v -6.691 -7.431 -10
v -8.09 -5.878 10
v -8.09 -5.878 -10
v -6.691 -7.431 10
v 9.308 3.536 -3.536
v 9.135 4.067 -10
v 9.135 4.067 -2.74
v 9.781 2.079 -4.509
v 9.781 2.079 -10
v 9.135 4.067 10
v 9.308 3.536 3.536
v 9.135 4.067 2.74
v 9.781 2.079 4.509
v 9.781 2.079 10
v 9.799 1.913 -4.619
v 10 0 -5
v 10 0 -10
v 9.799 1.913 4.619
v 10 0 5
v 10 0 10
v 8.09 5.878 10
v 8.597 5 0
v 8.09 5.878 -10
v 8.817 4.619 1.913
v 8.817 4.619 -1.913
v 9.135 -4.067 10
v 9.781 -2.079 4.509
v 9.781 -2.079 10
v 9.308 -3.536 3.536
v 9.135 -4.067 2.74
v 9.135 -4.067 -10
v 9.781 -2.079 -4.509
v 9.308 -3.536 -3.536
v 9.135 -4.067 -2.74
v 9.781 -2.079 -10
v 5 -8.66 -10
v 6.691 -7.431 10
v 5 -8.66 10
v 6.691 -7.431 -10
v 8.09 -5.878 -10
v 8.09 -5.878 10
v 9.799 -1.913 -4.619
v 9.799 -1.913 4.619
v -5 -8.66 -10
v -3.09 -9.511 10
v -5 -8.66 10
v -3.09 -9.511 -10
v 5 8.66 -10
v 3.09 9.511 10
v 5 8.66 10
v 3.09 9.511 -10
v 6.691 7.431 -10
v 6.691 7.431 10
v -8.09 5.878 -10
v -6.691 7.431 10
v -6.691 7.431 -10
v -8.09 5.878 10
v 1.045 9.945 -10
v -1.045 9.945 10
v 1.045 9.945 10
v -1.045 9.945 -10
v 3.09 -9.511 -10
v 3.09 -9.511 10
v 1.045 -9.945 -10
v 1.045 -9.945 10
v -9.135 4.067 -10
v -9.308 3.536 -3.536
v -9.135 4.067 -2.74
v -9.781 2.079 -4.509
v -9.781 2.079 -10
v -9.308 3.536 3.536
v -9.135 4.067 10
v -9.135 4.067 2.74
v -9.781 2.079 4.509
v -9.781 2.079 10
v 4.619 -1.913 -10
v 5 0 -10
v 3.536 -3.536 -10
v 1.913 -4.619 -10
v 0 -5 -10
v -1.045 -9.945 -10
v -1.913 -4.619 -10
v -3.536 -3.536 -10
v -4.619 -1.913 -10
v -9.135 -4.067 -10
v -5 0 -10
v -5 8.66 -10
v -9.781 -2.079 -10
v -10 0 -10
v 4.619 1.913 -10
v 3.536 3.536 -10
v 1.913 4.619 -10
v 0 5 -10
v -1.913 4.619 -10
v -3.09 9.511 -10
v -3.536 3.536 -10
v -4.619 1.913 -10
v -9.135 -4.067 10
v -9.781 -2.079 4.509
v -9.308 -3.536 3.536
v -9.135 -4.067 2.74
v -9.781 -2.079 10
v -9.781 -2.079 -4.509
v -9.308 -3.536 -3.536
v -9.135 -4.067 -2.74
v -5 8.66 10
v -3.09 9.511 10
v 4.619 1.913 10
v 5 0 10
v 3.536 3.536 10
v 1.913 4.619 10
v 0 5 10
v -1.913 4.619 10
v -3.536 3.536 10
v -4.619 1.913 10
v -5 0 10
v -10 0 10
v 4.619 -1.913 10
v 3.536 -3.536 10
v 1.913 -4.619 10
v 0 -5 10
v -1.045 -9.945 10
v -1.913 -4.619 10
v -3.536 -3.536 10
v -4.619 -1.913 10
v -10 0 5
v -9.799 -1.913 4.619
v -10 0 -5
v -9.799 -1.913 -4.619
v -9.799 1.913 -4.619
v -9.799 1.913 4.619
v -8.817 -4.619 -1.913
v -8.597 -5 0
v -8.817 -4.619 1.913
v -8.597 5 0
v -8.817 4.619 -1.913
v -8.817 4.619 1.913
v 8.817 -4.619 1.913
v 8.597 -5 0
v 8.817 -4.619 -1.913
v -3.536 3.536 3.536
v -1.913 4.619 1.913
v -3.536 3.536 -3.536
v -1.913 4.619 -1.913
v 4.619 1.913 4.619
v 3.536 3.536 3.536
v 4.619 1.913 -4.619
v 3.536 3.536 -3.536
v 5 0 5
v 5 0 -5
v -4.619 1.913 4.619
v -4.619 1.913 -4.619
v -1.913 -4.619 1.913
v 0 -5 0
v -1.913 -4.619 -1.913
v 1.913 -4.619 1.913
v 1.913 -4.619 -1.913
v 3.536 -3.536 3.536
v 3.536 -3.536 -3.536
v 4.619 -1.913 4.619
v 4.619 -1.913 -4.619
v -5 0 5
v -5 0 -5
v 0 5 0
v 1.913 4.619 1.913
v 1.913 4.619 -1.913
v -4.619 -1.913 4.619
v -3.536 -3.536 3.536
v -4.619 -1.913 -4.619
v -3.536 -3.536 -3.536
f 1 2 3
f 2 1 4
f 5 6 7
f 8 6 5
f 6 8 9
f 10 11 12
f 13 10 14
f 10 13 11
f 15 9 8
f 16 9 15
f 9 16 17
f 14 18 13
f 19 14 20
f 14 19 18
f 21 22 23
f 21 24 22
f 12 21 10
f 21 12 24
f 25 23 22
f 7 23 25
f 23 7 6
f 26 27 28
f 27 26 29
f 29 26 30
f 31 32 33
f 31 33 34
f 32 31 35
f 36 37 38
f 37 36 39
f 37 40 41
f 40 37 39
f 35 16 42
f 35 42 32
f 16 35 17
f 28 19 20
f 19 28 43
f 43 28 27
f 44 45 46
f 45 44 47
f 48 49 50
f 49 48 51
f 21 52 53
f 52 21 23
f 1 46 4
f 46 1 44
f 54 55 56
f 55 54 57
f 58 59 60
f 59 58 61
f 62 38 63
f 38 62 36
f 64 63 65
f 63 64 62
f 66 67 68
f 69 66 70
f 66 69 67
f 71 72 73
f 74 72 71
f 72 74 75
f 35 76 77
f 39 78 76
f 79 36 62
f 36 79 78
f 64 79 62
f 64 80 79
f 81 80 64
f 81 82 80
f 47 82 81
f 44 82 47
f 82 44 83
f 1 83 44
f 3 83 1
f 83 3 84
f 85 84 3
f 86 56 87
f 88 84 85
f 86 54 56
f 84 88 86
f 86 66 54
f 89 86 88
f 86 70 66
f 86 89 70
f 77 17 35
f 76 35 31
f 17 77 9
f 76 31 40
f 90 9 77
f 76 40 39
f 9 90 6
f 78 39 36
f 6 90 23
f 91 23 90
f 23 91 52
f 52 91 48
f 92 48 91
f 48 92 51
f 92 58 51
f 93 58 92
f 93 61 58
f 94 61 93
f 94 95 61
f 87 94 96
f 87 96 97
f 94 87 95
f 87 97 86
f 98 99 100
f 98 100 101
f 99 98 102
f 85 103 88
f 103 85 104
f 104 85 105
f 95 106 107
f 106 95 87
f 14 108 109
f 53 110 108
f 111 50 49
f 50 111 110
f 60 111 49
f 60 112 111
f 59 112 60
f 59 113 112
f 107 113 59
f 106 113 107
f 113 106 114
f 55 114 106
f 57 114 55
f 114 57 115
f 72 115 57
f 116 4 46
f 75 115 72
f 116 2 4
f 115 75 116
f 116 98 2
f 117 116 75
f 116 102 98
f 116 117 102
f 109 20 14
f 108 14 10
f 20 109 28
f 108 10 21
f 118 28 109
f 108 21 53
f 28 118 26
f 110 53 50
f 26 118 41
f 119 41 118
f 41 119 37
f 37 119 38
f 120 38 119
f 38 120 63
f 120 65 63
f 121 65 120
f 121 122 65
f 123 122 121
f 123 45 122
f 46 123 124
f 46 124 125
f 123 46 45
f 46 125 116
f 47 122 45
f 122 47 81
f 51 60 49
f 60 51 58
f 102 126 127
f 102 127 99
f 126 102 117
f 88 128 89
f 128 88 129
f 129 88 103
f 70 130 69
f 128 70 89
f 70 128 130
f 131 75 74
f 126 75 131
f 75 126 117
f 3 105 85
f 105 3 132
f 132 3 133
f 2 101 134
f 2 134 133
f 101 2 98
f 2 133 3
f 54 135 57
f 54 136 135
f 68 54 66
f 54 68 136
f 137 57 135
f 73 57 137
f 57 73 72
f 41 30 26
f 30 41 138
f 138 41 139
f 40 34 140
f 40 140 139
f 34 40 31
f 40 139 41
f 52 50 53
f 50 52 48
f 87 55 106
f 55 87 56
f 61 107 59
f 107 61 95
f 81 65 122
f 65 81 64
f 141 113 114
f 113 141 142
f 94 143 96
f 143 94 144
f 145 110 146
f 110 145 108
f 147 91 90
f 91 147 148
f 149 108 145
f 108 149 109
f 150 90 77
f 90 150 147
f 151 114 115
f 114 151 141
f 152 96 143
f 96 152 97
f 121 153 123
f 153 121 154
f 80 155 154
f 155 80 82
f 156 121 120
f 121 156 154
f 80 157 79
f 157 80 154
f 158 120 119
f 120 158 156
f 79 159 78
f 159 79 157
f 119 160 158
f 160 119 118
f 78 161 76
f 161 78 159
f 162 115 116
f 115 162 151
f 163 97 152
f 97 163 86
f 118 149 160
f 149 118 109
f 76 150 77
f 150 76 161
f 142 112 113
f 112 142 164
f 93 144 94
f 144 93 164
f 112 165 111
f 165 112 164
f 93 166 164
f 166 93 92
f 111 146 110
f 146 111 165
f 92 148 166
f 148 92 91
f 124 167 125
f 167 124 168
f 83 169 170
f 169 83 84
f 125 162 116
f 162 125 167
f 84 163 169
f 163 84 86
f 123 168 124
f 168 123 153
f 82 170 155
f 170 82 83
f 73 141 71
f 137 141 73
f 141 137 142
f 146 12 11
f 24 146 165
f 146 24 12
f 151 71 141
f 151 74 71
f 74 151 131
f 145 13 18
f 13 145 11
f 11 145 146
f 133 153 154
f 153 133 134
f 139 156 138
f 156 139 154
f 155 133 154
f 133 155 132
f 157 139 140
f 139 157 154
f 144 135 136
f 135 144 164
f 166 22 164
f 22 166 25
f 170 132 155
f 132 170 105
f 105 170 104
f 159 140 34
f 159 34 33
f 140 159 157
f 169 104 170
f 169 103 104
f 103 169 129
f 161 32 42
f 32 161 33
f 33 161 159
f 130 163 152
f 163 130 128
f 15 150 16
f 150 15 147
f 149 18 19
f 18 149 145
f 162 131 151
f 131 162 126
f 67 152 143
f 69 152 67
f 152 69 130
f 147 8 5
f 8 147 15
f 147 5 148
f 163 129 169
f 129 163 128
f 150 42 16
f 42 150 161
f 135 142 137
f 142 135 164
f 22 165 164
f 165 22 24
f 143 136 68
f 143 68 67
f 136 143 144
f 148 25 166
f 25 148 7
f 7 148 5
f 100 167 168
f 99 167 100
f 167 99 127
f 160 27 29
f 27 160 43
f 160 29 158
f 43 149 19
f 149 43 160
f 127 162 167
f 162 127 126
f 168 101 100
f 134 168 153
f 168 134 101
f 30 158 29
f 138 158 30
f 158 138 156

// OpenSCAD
difference() {
	translate(v = [0, 0, -10]) {
		cylinder(h = 20, r = 10);
	}
	translate(v = [0, 0, -10.5000000000]) {
		cylinder(h = 21, r = 5);
	}
	rotate(a = 90, v = [0, 1, 0]) {
		translate(v = [0, 0, -10]) {
			cylinder(h = 20, r = 5);
		}
	}
}
